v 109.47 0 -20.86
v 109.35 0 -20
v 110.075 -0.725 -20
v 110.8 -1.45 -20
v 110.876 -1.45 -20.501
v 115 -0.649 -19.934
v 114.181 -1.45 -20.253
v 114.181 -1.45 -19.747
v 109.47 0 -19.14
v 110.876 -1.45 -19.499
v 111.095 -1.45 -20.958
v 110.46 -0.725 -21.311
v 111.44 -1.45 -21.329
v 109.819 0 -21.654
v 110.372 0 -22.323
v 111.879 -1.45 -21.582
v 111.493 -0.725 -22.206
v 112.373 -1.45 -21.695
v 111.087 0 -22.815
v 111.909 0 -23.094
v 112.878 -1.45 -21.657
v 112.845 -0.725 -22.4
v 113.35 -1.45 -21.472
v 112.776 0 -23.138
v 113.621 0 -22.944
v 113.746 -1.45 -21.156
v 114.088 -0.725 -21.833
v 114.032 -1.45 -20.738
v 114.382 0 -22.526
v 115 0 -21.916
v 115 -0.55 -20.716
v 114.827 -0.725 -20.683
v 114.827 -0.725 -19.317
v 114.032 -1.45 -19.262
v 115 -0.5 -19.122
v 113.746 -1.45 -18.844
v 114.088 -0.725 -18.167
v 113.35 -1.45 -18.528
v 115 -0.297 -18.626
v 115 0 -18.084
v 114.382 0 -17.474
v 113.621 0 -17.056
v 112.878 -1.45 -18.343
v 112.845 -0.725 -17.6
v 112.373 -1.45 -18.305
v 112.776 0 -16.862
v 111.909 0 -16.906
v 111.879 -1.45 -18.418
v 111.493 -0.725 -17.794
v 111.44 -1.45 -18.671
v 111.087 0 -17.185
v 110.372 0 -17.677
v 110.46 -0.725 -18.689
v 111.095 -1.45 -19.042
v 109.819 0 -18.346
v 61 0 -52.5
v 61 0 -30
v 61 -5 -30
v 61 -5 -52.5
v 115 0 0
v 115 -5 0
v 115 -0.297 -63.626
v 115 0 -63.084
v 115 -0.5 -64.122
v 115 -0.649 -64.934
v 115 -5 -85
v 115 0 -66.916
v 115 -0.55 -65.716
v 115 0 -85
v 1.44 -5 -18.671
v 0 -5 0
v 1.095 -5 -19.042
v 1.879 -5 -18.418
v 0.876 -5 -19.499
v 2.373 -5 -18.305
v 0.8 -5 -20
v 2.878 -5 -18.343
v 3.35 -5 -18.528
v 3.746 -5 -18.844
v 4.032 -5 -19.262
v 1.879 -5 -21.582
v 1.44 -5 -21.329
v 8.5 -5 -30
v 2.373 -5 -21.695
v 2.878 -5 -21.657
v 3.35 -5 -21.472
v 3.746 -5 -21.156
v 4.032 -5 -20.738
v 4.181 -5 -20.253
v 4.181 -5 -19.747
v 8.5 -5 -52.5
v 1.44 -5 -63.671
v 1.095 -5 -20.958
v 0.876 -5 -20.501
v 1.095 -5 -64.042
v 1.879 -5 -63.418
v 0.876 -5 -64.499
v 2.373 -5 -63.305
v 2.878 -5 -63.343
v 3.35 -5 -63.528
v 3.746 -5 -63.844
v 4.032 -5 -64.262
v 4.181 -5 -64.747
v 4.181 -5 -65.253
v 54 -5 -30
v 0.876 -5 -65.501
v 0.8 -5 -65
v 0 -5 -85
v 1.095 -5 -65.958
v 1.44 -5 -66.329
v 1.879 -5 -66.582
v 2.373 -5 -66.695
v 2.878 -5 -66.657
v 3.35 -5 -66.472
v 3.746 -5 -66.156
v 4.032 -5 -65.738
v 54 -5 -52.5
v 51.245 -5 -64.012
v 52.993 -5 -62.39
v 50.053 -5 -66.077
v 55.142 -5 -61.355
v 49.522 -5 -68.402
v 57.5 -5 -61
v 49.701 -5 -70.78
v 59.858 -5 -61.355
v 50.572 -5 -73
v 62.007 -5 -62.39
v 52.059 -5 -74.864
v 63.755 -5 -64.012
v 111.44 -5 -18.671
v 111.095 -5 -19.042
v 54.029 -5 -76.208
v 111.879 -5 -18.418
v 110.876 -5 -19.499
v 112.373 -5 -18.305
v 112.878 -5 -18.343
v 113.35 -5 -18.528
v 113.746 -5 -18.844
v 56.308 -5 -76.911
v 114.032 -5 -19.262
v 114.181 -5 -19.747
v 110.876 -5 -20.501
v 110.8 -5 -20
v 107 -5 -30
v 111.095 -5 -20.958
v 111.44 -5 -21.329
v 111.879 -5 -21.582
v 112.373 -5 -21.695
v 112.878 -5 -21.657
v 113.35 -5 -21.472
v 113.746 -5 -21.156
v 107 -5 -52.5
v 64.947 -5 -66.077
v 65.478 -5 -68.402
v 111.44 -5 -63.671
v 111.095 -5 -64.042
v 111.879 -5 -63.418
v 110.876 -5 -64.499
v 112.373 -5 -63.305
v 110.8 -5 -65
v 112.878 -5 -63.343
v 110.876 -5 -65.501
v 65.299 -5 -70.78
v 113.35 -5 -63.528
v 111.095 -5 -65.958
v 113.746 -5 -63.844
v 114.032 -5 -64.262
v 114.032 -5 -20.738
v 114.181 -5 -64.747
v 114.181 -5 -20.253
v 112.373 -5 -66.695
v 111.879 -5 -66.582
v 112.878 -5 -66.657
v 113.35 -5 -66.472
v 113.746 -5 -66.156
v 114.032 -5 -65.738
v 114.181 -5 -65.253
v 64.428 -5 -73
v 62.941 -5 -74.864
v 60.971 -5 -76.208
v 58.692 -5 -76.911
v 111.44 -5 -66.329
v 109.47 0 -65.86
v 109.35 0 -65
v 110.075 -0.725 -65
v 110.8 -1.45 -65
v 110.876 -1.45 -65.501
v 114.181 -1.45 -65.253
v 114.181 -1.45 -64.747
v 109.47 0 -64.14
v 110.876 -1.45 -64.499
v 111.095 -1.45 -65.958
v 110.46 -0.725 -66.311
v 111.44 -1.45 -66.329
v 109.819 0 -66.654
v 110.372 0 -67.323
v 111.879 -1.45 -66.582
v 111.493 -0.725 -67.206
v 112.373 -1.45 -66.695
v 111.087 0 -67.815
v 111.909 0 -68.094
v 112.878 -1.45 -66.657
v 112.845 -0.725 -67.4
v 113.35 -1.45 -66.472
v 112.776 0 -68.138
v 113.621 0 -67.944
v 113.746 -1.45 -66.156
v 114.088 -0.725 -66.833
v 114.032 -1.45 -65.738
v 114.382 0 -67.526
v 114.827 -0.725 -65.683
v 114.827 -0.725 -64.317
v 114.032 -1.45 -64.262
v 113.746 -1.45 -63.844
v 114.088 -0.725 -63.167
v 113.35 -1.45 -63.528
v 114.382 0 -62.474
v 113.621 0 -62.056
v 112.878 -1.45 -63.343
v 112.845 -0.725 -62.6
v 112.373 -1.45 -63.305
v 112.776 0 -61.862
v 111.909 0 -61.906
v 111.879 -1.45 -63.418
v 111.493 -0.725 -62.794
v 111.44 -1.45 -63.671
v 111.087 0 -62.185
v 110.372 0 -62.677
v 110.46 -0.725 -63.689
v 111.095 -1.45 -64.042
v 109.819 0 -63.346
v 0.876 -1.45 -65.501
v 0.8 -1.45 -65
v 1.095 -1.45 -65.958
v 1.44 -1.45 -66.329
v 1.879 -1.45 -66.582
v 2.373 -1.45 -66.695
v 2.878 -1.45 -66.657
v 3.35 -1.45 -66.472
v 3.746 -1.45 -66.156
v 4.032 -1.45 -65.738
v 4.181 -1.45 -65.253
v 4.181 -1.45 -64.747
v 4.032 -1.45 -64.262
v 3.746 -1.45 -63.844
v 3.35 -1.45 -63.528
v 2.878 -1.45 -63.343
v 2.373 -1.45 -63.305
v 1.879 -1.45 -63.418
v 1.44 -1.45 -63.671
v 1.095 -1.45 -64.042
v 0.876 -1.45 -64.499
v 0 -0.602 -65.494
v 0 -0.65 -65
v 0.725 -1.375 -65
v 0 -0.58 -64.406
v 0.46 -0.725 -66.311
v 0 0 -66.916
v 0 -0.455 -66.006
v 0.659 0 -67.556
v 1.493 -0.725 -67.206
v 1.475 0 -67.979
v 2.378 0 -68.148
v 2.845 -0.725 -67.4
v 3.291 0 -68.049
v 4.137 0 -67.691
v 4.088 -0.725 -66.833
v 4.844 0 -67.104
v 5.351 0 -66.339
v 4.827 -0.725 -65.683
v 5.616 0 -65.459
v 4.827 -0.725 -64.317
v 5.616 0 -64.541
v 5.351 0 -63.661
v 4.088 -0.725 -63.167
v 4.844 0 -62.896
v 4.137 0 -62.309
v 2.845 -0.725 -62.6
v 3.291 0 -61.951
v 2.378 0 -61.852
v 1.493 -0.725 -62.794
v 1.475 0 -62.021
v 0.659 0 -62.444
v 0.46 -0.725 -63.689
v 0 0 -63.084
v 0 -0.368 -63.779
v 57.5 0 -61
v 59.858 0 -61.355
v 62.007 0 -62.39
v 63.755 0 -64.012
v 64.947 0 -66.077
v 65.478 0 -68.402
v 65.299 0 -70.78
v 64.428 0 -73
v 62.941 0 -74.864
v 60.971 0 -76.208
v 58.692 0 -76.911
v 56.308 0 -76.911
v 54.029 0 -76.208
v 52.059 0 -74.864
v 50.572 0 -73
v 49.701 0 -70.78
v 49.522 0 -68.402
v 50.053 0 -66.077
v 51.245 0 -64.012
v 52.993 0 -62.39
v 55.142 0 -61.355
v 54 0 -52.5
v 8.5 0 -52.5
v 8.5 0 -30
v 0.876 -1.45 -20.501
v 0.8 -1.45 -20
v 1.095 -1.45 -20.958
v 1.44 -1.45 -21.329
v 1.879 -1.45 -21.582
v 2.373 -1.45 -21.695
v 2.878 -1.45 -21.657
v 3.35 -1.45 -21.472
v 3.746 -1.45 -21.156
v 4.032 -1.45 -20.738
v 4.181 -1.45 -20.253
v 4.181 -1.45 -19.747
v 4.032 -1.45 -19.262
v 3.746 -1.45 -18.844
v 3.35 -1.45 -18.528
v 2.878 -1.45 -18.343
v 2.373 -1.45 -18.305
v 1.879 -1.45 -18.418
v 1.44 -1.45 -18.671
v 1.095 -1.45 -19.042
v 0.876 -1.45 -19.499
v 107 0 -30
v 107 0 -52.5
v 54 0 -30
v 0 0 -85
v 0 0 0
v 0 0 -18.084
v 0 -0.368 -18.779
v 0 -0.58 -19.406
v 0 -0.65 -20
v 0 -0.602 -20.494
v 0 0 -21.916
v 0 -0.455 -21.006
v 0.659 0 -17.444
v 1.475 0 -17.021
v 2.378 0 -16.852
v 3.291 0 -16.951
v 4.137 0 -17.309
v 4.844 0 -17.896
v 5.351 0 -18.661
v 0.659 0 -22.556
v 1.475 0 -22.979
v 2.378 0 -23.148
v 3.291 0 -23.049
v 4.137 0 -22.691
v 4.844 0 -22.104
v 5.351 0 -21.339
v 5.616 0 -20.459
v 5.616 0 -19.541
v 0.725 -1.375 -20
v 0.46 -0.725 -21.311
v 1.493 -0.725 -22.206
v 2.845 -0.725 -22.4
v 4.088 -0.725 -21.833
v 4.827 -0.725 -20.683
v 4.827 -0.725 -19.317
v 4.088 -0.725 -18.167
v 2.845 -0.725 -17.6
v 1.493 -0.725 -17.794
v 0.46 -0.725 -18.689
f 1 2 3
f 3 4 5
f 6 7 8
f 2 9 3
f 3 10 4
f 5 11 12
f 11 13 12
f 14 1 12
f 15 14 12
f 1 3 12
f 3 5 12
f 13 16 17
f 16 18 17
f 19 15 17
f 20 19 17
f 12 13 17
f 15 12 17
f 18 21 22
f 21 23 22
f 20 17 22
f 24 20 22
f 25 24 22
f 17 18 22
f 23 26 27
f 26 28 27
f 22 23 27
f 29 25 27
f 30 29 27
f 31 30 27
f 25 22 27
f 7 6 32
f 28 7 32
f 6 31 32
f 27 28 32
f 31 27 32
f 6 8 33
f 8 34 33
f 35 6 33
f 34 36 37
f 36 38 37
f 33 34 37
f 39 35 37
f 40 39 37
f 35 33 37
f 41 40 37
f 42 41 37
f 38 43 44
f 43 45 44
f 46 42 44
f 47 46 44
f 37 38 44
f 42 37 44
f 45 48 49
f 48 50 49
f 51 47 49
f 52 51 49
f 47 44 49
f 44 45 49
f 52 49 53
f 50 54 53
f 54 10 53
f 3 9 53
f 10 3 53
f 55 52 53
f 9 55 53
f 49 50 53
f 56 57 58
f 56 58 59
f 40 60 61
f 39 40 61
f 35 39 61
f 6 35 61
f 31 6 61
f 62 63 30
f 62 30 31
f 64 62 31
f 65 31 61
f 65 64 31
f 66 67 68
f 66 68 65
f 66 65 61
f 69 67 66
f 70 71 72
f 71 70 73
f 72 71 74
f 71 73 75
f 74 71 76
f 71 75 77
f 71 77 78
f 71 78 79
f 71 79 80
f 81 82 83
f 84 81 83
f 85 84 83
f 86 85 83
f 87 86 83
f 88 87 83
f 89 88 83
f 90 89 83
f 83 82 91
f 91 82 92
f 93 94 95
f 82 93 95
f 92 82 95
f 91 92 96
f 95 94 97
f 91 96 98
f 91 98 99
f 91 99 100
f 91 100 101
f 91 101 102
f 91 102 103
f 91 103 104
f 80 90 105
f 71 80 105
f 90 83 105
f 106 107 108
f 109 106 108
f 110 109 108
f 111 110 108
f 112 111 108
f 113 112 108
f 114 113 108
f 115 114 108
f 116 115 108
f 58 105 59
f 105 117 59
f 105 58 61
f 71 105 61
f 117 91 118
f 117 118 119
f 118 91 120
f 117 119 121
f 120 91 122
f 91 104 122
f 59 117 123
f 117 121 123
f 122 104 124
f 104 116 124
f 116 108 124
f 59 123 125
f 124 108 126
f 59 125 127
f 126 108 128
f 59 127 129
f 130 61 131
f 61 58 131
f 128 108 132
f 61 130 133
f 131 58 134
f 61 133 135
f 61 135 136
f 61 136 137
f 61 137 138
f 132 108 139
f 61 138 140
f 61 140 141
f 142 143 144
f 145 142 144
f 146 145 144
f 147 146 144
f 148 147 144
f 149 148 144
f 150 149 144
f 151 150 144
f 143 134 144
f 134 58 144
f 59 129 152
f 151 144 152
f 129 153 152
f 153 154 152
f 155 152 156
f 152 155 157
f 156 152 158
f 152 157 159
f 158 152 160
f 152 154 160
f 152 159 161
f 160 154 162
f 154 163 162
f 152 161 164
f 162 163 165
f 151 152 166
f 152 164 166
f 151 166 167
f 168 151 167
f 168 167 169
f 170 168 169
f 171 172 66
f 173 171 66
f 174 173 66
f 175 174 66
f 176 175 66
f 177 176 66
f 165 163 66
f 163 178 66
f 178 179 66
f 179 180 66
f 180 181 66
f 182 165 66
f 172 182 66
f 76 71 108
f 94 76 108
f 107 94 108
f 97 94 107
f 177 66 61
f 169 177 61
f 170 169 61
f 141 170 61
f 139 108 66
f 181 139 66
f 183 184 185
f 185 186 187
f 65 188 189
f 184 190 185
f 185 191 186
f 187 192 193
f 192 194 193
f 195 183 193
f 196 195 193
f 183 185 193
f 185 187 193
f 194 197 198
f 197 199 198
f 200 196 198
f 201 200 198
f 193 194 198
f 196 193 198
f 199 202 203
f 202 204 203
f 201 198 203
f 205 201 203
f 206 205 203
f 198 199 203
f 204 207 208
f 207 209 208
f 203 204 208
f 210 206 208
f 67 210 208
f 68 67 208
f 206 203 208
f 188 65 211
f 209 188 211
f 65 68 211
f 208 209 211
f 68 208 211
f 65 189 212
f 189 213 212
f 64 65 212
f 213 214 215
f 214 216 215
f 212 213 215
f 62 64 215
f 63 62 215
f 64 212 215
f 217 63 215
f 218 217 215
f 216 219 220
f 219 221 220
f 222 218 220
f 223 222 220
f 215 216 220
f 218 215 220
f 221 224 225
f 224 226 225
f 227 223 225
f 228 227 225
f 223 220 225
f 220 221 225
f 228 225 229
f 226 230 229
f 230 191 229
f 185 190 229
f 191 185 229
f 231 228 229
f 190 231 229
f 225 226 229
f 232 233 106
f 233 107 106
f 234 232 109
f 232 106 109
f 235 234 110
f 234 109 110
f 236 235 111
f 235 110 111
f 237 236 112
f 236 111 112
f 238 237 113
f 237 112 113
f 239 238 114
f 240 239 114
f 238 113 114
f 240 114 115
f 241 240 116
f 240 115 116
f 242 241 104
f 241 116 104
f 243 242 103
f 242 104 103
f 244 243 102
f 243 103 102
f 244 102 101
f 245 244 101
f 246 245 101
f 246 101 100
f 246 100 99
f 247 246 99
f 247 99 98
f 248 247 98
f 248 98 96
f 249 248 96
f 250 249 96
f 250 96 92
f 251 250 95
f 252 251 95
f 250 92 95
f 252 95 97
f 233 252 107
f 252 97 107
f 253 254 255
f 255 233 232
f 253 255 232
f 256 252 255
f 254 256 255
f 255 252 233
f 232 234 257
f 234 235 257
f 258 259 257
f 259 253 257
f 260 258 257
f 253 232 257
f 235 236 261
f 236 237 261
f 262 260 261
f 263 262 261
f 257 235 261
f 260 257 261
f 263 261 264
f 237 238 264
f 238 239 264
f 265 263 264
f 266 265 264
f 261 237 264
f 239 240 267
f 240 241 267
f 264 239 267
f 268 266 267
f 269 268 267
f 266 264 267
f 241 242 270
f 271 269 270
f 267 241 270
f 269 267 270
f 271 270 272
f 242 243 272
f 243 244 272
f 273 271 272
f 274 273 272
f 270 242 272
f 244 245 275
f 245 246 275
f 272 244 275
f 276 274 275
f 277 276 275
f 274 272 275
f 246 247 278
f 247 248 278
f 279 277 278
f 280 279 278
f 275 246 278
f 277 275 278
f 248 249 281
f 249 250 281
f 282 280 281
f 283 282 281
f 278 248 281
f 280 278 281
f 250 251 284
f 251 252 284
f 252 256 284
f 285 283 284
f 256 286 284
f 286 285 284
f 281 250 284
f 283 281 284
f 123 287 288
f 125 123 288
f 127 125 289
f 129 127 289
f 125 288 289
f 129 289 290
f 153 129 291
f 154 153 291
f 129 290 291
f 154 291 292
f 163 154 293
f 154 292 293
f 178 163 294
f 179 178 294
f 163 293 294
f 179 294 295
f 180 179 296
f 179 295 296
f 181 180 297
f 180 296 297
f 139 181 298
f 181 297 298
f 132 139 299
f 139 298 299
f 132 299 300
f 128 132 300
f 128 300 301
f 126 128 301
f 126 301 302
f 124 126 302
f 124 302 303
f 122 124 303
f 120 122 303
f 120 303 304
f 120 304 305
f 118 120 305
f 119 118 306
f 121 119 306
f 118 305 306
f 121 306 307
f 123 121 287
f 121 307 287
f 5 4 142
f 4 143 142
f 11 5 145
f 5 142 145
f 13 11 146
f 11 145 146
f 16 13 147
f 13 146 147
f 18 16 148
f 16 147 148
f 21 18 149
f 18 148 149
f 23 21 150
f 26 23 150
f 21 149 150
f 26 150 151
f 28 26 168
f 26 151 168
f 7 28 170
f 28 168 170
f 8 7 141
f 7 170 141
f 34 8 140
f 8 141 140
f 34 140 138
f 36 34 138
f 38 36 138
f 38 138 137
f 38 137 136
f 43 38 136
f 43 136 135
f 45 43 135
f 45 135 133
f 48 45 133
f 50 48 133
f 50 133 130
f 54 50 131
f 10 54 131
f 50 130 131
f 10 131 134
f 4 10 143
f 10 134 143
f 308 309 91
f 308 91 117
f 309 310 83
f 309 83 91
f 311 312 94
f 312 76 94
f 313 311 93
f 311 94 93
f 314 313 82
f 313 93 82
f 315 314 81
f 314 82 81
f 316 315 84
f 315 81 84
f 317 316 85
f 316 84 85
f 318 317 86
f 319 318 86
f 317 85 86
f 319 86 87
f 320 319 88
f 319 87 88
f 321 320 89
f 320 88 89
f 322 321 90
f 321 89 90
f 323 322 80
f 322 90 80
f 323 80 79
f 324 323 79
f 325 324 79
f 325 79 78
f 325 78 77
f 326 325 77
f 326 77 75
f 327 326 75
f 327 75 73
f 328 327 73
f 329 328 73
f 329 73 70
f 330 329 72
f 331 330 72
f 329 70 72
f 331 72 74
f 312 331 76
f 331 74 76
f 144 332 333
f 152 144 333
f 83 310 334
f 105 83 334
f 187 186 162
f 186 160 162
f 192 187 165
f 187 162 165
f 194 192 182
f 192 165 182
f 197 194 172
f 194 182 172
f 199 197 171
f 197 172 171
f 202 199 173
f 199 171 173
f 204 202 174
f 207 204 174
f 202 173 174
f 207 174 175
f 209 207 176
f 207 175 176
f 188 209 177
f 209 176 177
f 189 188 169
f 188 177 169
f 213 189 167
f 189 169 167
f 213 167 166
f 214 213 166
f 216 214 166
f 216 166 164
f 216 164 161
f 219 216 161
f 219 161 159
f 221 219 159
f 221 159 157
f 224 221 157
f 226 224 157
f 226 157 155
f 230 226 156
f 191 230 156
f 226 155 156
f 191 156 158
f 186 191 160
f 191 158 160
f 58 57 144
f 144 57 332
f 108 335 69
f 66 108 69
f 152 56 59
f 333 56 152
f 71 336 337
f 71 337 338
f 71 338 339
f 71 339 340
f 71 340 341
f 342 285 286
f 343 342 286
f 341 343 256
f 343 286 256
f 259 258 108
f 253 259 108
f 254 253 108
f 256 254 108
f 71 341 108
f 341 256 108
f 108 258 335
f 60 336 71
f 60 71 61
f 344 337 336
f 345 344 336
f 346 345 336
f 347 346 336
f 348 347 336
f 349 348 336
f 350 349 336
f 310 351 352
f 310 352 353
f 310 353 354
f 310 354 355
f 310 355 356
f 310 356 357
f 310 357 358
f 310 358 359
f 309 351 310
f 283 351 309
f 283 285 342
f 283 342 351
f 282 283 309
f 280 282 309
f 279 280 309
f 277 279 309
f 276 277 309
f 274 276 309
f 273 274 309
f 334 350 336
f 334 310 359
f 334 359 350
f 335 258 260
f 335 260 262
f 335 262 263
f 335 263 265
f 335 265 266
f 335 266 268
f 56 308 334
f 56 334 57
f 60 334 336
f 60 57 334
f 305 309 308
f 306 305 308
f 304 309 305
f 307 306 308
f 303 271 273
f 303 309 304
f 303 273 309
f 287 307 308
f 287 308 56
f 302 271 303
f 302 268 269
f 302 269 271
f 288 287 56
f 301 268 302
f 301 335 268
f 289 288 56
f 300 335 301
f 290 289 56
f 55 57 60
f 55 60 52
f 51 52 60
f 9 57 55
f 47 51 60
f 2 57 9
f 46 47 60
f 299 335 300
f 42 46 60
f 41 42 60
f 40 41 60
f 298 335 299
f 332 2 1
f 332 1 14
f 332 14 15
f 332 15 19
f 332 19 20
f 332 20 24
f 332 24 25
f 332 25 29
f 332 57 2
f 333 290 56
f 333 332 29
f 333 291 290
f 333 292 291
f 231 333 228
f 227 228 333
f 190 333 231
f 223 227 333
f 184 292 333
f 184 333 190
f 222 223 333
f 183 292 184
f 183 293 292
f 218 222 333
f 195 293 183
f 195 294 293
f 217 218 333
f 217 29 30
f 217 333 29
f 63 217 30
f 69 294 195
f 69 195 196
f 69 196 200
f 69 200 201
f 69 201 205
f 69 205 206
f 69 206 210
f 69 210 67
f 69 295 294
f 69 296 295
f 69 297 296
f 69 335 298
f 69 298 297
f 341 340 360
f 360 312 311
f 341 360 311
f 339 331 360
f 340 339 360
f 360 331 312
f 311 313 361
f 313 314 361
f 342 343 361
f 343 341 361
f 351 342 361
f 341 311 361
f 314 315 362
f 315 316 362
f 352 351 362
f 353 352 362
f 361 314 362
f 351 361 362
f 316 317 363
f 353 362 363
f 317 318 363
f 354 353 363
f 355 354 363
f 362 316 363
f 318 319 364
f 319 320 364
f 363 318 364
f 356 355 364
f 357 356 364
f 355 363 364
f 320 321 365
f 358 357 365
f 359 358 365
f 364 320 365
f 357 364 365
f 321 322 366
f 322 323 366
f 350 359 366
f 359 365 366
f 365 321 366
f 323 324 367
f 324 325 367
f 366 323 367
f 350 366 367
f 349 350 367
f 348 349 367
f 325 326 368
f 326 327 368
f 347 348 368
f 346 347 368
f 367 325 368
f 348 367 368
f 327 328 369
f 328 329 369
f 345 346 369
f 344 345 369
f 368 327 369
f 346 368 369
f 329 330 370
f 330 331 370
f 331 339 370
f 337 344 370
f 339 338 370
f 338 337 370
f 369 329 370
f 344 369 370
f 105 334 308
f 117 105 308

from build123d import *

# Parameters (mm, degrees)
SKETCH1_W                                           = 115
SKETCH1_H                                           = 85
SKETCH1_R                                           = 8
SKETCH1_W_2                                         = 45.5
SKETCH1_H_2                                         = 22.5
SKETCH1_W_3                                         = 46
BOSS_EXTRUDE1_DEPTH                                 = 5
CSK_FOR_M3_FLAT_COUNTERSUNK_HEAD_SCREW1_D           = 3.4
CSK_FOR_M3_FLAT_COUNTERSUNK_HEAD_SCREW1_CSINK_D     = 6.3
CSK_FOR_M3_FLAT_COUNTERSUNK_HEAD_SCREW1_CSINK_ANGLE = 90


with BuildPart() as part:
    # Sketch1 → Boss-Extrude1 (new body)
    with BuildSketch(Plane(origin=(0, 0, 0), x_dir=(1, 0, 0), z_dir=(0, 1, 0))):
        with Locations((57.5, 42.5)):
            Rectangle(SKETCH1_W, SKETCH1_H)
        with Locations(Location((57.5, 69, 0), (0, 0, 270))):
            Circle(SKETCH1_R, mode=Mode.SUBTRACT)
        with Locations((31.25, 41.25)):
            Rectangle(SKETCH1_W_2, SKETCH1_H_2, mode=Mode.SUBTRACT)
        with Locations((84, 41.25)):
            Rectangle(SKETCH1_W_3, SKETCH1_H_2, mode=Mode.SUBTRACT)
    extrude(amount=-BOSS_EXTRUDE1_DEPTH)

    # CSK for M3 Flat Countersunk Head Screw1 (through all)
    with Locations(Plane(origin=(0, 0, 0), x_dir=(1, 0, 0), z_dir=(0, 1, 0))):
        with Locations((2.5, 65), (2.5, 20), (112.5, 65), (112.5, 20)):
            CounterSinkHole(CSK_FOR_M3_FLAT_COUNTERSUNK_HEAD_SCREW1_D / 2, CSK_FOR_M3_FLAT_COUNTERSUNK_HEAD_SCREW1_CSINK_D / 2, counter_sink_angle=CSK_FOR_M3_FLAT_COUNTERSUNK_HEAD_SCREW1_CSINK_ANGLE)


solid = part.part
